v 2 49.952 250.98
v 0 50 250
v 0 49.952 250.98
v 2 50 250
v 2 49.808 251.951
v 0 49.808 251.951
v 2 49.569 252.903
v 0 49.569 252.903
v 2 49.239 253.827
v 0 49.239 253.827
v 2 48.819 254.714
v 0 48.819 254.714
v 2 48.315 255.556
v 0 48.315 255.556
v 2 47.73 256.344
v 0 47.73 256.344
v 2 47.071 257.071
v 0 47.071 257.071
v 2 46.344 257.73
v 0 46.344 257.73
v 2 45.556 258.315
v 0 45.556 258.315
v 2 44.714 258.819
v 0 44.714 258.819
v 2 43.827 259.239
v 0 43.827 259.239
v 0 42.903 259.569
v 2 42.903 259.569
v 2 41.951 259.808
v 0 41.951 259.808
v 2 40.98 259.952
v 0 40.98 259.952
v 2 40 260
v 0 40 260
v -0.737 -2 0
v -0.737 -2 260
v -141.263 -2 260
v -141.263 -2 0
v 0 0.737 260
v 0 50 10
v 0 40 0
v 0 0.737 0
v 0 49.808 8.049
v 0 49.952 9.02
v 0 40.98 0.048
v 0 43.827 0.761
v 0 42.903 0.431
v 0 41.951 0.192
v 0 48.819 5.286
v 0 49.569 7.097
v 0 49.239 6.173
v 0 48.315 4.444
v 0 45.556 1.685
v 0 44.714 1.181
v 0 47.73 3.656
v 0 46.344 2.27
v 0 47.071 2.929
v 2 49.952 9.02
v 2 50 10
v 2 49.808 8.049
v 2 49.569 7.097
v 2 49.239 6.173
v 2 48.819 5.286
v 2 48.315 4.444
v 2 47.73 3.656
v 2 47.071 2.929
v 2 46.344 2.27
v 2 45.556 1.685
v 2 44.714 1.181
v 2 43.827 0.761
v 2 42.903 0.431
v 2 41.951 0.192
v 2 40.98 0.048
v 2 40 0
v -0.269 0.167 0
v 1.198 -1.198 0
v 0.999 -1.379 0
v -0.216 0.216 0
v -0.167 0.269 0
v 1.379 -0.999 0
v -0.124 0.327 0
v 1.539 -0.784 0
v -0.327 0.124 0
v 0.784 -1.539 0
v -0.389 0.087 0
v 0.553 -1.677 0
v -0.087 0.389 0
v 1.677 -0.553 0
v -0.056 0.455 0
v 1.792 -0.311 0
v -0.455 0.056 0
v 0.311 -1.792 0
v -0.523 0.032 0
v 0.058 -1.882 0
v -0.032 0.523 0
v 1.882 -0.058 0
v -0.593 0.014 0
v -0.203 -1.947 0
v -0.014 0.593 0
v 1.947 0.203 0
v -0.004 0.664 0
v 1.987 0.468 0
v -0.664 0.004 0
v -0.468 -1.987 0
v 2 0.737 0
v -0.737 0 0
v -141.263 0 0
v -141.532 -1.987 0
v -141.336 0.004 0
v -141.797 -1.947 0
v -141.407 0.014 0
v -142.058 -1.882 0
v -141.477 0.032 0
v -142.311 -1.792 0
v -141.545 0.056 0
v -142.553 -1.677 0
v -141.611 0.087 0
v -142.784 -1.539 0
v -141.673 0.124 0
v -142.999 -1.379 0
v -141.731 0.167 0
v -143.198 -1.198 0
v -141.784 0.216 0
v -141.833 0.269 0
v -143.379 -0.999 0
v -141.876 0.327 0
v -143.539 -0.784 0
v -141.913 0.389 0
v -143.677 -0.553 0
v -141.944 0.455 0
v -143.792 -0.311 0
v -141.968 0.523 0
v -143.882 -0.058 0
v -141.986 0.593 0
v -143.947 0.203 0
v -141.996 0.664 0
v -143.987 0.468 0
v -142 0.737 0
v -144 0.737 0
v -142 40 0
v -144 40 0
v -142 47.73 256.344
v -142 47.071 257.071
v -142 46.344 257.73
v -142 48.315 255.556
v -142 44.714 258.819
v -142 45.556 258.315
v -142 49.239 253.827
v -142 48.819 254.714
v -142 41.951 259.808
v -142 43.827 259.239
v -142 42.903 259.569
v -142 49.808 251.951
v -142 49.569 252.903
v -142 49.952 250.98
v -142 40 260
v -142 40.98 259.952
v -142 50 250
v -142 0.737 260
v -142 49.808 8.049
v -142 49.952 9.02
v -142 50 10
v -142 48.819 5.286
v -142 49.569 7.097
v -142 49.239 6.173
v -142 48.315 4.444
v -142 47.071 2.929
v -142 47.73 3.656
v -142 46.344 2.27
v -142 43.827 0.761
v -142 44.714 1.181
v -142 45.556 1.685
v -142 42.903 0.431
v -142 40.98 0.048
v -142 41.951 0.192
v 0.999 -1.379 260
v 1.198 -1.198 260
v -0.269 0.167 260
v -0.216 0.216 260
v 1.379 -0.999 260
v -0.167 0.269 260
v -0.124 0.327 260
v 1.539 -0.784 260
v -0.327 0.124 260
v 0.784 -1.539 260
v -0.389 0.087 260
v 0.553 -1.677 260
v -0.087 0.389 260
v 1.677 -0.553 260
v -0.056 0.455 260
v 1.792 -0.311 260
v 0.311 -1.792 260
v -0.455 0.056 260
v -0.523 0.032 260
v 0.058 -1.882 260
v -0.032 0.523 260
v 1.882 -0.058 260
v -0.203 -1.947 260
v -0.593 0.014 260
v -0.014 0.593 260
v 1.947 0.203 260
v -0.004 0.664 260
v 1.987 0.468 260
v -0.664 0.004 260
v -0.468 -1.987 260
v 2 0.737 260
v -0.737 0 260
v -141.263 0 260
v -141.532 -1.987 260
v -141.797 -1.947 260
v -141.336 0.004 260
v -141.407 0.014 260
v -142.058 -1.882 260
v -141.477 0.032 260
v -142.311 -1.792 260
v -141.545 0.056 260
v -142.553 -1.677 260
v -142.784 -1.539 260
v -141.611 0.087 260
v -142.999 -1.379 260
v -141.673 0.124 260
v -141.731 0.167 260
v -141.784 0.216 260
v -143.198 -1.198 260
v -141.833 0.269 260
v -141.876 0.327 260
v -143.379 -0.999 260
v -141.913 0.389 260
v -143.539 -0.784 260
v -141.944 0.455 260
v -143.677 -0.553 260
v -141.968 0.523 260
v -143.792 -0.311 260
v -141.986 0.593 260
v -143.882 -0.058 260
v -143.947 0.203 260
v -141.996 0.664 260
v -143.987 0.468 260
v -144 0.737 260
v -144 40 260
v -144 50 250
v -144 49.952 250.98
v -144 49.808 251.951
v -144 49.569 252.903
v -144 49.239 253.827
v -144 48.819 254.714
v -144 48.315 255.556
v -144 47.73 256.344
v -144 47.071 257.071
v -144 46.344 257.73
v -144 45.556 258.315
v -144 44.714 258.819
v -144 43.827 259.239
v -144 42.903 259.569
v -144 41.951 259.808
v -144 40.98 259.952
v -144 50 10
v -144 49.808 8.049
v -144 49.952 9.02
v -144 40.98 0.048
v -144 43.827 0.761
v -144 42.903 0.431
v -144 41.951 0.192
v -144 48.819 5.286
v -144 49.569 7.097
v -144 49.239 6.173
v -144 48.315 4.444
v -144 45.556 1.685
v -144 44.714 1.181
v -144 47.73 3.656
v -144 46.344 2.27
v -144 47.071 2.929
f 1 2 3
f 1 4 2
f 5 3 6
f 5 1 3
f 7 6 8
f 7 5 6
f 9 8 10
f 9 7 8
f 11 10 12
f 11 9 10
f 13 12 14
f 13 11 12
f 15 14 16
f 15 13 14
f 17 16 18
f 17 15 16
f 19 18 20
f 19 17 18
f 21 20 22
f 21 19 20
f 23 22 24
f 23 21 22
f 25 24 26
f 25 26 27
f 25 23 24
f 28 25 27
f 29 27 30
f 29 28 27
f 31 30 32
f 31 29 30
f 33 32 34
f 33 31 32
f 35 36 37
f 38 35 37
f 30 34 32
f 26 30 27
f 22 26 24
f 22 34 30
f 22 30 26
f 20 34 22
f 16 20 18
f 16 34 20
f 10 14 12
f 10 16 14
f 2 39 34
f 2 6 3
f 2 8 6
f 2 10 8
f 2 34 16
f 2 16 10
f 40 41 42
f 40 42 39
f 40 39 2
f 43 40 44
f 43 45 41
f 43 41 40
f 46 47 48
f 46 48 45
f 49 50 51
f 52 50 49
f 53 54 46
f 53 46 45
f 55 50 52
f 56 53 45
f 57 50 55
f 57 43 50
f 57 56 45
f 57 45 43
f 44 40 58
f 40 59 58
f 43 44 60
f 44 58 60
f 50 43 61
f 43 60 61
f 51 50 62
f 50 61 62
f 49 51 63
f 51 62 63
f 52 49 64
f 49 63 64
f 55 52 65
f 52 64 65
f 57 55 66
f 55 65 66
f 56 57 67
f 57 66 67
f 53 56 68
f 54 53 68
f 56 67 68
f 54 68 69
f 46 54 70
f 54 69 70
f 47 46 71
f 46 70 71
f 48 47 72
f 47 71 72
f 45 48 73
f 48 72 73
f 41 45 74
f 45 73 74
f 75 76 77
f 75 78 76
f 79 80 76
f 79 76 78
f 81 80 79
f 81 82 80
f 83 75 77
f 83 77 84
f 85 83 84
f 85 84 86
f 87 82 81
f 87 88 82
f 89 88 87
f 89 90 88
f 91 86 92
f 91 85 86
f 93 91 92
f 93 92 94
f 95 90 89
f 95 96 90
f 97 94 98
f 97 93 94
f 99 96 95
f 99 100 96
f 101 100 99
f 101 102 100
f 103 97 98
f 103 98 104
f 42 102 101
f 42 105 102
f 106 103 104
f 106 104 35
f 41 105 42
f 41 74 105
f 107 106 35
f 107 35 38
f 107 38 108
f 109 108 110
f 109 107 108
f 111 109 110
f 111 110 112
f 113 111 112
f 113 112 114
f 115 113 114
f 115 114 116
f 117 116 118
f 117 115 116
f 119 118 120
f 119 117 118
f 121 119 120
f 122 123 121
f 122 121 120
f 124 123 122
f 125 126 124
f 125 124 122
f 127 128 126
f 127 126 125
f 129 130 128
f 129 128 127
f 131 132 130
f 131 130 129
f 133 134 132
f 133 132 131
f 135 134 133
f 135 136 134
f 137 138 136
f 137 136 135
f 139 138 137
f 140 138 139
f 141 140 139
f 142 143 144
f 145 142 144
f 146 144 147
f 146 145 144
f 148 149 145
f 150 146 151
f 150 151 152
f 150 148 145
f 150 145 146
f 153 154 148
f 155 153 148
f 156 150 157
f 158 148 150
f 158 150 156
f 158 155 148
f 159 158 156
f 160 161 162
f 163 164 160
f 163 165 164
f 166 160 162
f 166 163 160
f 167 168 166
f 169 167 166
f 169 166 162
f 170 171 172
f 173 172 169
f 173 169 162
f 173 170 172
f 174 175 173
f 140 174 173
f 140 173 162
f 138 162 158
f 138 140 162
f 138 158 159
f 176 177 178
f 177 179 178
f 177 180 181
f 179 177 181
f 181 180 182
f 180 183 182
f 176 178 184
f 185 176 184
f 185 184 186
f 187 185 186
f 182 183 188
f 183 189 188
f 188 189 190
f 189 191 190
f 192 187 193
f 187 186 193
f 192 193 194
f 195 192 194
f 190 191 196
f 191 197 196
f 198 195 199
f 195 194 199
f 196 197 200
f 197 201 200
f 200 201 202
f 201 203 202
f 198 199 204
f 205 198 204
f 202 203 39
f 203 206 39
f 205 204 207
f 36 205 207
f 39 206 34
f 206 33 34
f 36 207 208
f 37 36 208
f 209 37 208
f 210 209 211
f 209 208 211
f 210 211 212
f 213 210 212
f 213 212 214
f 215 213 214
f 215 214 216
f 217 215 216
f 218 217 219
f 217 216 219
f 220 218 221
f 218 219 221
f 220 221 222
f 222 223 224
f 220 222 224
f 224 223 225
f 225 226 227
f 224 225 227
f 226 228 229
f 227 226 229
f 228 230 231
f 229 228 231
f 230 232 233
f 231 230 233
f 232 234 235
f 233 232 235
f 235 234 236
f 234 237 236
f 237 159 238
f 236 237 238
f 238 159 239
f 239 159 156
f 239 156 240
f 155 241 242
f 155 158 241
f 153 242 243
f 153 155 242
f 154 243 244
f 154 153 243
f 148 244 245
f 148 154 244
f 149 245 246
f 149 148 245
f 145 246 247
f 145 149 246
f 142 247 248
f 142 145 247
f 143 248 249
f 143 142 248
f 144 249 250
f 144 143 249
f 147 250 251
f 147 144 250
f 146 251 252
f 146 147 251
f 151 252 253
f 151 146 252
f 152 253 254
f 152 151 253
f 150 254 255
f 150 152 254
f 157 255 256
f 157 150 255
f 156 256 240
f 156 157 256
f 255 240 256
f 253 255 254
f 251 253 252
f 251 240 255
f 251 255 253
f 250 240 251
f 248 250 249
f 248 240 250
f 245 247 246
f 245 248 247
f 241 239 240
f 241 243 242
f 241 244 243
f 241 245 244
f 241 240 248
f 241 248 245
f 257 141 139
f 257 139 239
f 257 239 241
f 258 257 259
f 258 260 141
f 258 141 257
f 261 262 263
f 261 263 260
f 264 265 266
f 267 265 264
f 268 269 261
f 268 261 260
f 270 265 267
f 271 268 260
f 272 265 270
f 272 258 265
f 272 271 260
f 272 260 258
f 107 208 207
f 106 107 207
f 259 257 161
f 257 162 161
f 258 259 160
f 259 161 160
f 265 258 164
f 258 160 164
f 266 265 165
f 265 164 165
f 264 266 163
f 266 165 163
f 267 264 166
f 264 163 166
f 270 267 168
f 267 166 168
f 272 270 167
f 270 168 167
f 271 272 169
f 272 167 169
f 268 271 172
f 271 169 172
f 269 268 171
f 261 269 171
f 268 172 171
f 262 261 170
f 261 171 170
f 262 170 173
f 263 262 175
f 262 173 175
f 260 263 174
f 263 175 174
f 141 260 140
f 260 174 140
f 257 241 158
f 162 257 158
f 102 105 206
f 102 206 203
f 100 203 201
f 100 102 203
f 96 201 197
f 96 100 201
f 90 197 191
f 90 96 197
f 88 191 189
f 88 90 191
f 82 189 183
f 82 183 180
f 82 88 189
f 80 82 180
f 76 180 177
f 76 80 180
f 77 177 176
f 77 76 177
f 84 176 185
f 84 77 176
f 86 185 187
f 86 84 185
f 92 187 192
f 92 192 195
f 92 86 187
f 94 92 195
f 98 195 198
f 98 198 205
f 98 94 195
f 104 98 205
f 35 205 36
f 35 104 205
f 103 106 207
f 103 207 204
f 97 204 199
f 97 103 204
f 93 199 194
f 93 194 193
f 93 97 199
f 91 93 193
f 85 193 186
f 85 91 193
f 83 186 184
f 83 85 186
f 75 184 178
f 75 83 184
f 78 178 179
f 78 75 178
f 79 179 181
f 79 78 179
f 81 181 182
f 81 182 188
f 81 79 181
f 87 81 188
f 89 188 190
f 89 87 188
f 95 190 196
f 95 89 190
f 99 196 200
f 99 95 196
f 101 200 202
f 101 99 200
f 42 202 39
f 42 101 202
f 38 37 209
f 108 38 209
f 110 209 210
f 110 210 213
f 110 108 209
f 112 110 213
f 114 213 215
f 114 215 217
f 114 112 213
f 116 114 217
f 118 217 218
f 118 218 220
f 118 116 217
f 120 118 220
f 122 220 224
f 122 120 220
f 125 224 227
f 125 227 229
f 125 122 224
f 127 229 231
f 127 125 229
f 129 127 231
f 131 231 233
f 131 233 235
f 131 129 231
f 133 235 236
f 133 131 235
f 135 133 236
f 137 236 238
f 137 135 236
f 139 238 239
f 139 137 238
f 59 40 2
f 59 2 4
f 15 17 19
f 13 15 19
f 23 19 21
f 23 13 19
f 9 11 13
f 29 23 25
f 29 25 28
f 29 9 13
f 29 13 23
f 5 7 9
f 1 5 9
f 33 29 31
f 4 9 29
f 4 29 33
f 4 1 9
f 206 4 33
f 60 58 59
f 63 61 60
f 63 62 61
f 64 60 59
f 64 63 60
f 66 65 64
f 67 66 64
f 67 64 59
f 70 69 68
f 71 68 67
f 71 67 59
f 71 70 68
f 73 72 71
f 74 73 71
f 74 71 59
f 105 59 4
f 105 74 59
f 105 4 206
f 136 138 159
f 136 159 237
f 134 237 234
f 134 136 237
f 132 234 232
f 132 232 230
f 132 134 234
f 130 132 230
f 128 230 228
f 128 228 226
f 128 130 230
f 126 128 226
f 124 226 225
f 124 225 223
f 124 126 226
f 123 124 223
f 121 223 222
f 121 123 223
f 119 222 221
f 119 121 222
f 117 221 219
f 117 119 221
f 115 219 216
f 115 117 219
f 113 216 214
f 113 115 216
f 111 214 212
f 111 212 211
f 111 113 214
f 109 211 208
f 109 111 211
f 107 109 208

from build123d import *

# Parameters (mm, degrees)
BASIS_BLECH1_DEPTH = 260
VERRUNDUNG1_R      = 10


# Sheet-metal steps are written as plain solids
with BuildPart() as part:
    # Skizze1 → Basis-Blech1 (new body)
    with BuildSketch(Plane.XY):
        with BuildLine():
            Line((-142, 50), (-142, 0.7366))
            ThreePointArc((-142, 0.7366), (-141.784254855, 0.215745145), (-141.2634, 0))
            Line((-141.2634, 0), (-0.7366, 0))
            ThreePointArc((-0.7366, 0), (-0.215745145, 0.215745145), (0, 0.7366))
            Line((0, 0.7366), (0, 50))
            Line((0, 50), (2, 50))
            Line((2, 50), (2, 0.7366))
            ThreePointArc((2, 0.7366), (1.198468417, -1.198468417), (-0.7366, -2))
            Line((-0.7366, -2), (-141.2634, -2))
            ThreePointArc((-141.2634, -2), (-143.198468417, -1.198468417), (-144, 0.7366))
            Line((-144, 0.7366), (-144, 50))
            Line((-144, 50), (-142, 50))
        make_face()
    extrude(amount=BASIS_BLECH1_DEPTH)

    # Verrundung1
    verrundung1_edges = [part.edges().sort_by_distance(p)[0] for p in [
        (-143, 50, 0),
        (1, 50, 0),
        (-143, 50, 260),
        (1, 50, 260),
    ]]
    fillet(verrundung1_edges, radius=VERRUNDUNG1_R)


solid = part.part
